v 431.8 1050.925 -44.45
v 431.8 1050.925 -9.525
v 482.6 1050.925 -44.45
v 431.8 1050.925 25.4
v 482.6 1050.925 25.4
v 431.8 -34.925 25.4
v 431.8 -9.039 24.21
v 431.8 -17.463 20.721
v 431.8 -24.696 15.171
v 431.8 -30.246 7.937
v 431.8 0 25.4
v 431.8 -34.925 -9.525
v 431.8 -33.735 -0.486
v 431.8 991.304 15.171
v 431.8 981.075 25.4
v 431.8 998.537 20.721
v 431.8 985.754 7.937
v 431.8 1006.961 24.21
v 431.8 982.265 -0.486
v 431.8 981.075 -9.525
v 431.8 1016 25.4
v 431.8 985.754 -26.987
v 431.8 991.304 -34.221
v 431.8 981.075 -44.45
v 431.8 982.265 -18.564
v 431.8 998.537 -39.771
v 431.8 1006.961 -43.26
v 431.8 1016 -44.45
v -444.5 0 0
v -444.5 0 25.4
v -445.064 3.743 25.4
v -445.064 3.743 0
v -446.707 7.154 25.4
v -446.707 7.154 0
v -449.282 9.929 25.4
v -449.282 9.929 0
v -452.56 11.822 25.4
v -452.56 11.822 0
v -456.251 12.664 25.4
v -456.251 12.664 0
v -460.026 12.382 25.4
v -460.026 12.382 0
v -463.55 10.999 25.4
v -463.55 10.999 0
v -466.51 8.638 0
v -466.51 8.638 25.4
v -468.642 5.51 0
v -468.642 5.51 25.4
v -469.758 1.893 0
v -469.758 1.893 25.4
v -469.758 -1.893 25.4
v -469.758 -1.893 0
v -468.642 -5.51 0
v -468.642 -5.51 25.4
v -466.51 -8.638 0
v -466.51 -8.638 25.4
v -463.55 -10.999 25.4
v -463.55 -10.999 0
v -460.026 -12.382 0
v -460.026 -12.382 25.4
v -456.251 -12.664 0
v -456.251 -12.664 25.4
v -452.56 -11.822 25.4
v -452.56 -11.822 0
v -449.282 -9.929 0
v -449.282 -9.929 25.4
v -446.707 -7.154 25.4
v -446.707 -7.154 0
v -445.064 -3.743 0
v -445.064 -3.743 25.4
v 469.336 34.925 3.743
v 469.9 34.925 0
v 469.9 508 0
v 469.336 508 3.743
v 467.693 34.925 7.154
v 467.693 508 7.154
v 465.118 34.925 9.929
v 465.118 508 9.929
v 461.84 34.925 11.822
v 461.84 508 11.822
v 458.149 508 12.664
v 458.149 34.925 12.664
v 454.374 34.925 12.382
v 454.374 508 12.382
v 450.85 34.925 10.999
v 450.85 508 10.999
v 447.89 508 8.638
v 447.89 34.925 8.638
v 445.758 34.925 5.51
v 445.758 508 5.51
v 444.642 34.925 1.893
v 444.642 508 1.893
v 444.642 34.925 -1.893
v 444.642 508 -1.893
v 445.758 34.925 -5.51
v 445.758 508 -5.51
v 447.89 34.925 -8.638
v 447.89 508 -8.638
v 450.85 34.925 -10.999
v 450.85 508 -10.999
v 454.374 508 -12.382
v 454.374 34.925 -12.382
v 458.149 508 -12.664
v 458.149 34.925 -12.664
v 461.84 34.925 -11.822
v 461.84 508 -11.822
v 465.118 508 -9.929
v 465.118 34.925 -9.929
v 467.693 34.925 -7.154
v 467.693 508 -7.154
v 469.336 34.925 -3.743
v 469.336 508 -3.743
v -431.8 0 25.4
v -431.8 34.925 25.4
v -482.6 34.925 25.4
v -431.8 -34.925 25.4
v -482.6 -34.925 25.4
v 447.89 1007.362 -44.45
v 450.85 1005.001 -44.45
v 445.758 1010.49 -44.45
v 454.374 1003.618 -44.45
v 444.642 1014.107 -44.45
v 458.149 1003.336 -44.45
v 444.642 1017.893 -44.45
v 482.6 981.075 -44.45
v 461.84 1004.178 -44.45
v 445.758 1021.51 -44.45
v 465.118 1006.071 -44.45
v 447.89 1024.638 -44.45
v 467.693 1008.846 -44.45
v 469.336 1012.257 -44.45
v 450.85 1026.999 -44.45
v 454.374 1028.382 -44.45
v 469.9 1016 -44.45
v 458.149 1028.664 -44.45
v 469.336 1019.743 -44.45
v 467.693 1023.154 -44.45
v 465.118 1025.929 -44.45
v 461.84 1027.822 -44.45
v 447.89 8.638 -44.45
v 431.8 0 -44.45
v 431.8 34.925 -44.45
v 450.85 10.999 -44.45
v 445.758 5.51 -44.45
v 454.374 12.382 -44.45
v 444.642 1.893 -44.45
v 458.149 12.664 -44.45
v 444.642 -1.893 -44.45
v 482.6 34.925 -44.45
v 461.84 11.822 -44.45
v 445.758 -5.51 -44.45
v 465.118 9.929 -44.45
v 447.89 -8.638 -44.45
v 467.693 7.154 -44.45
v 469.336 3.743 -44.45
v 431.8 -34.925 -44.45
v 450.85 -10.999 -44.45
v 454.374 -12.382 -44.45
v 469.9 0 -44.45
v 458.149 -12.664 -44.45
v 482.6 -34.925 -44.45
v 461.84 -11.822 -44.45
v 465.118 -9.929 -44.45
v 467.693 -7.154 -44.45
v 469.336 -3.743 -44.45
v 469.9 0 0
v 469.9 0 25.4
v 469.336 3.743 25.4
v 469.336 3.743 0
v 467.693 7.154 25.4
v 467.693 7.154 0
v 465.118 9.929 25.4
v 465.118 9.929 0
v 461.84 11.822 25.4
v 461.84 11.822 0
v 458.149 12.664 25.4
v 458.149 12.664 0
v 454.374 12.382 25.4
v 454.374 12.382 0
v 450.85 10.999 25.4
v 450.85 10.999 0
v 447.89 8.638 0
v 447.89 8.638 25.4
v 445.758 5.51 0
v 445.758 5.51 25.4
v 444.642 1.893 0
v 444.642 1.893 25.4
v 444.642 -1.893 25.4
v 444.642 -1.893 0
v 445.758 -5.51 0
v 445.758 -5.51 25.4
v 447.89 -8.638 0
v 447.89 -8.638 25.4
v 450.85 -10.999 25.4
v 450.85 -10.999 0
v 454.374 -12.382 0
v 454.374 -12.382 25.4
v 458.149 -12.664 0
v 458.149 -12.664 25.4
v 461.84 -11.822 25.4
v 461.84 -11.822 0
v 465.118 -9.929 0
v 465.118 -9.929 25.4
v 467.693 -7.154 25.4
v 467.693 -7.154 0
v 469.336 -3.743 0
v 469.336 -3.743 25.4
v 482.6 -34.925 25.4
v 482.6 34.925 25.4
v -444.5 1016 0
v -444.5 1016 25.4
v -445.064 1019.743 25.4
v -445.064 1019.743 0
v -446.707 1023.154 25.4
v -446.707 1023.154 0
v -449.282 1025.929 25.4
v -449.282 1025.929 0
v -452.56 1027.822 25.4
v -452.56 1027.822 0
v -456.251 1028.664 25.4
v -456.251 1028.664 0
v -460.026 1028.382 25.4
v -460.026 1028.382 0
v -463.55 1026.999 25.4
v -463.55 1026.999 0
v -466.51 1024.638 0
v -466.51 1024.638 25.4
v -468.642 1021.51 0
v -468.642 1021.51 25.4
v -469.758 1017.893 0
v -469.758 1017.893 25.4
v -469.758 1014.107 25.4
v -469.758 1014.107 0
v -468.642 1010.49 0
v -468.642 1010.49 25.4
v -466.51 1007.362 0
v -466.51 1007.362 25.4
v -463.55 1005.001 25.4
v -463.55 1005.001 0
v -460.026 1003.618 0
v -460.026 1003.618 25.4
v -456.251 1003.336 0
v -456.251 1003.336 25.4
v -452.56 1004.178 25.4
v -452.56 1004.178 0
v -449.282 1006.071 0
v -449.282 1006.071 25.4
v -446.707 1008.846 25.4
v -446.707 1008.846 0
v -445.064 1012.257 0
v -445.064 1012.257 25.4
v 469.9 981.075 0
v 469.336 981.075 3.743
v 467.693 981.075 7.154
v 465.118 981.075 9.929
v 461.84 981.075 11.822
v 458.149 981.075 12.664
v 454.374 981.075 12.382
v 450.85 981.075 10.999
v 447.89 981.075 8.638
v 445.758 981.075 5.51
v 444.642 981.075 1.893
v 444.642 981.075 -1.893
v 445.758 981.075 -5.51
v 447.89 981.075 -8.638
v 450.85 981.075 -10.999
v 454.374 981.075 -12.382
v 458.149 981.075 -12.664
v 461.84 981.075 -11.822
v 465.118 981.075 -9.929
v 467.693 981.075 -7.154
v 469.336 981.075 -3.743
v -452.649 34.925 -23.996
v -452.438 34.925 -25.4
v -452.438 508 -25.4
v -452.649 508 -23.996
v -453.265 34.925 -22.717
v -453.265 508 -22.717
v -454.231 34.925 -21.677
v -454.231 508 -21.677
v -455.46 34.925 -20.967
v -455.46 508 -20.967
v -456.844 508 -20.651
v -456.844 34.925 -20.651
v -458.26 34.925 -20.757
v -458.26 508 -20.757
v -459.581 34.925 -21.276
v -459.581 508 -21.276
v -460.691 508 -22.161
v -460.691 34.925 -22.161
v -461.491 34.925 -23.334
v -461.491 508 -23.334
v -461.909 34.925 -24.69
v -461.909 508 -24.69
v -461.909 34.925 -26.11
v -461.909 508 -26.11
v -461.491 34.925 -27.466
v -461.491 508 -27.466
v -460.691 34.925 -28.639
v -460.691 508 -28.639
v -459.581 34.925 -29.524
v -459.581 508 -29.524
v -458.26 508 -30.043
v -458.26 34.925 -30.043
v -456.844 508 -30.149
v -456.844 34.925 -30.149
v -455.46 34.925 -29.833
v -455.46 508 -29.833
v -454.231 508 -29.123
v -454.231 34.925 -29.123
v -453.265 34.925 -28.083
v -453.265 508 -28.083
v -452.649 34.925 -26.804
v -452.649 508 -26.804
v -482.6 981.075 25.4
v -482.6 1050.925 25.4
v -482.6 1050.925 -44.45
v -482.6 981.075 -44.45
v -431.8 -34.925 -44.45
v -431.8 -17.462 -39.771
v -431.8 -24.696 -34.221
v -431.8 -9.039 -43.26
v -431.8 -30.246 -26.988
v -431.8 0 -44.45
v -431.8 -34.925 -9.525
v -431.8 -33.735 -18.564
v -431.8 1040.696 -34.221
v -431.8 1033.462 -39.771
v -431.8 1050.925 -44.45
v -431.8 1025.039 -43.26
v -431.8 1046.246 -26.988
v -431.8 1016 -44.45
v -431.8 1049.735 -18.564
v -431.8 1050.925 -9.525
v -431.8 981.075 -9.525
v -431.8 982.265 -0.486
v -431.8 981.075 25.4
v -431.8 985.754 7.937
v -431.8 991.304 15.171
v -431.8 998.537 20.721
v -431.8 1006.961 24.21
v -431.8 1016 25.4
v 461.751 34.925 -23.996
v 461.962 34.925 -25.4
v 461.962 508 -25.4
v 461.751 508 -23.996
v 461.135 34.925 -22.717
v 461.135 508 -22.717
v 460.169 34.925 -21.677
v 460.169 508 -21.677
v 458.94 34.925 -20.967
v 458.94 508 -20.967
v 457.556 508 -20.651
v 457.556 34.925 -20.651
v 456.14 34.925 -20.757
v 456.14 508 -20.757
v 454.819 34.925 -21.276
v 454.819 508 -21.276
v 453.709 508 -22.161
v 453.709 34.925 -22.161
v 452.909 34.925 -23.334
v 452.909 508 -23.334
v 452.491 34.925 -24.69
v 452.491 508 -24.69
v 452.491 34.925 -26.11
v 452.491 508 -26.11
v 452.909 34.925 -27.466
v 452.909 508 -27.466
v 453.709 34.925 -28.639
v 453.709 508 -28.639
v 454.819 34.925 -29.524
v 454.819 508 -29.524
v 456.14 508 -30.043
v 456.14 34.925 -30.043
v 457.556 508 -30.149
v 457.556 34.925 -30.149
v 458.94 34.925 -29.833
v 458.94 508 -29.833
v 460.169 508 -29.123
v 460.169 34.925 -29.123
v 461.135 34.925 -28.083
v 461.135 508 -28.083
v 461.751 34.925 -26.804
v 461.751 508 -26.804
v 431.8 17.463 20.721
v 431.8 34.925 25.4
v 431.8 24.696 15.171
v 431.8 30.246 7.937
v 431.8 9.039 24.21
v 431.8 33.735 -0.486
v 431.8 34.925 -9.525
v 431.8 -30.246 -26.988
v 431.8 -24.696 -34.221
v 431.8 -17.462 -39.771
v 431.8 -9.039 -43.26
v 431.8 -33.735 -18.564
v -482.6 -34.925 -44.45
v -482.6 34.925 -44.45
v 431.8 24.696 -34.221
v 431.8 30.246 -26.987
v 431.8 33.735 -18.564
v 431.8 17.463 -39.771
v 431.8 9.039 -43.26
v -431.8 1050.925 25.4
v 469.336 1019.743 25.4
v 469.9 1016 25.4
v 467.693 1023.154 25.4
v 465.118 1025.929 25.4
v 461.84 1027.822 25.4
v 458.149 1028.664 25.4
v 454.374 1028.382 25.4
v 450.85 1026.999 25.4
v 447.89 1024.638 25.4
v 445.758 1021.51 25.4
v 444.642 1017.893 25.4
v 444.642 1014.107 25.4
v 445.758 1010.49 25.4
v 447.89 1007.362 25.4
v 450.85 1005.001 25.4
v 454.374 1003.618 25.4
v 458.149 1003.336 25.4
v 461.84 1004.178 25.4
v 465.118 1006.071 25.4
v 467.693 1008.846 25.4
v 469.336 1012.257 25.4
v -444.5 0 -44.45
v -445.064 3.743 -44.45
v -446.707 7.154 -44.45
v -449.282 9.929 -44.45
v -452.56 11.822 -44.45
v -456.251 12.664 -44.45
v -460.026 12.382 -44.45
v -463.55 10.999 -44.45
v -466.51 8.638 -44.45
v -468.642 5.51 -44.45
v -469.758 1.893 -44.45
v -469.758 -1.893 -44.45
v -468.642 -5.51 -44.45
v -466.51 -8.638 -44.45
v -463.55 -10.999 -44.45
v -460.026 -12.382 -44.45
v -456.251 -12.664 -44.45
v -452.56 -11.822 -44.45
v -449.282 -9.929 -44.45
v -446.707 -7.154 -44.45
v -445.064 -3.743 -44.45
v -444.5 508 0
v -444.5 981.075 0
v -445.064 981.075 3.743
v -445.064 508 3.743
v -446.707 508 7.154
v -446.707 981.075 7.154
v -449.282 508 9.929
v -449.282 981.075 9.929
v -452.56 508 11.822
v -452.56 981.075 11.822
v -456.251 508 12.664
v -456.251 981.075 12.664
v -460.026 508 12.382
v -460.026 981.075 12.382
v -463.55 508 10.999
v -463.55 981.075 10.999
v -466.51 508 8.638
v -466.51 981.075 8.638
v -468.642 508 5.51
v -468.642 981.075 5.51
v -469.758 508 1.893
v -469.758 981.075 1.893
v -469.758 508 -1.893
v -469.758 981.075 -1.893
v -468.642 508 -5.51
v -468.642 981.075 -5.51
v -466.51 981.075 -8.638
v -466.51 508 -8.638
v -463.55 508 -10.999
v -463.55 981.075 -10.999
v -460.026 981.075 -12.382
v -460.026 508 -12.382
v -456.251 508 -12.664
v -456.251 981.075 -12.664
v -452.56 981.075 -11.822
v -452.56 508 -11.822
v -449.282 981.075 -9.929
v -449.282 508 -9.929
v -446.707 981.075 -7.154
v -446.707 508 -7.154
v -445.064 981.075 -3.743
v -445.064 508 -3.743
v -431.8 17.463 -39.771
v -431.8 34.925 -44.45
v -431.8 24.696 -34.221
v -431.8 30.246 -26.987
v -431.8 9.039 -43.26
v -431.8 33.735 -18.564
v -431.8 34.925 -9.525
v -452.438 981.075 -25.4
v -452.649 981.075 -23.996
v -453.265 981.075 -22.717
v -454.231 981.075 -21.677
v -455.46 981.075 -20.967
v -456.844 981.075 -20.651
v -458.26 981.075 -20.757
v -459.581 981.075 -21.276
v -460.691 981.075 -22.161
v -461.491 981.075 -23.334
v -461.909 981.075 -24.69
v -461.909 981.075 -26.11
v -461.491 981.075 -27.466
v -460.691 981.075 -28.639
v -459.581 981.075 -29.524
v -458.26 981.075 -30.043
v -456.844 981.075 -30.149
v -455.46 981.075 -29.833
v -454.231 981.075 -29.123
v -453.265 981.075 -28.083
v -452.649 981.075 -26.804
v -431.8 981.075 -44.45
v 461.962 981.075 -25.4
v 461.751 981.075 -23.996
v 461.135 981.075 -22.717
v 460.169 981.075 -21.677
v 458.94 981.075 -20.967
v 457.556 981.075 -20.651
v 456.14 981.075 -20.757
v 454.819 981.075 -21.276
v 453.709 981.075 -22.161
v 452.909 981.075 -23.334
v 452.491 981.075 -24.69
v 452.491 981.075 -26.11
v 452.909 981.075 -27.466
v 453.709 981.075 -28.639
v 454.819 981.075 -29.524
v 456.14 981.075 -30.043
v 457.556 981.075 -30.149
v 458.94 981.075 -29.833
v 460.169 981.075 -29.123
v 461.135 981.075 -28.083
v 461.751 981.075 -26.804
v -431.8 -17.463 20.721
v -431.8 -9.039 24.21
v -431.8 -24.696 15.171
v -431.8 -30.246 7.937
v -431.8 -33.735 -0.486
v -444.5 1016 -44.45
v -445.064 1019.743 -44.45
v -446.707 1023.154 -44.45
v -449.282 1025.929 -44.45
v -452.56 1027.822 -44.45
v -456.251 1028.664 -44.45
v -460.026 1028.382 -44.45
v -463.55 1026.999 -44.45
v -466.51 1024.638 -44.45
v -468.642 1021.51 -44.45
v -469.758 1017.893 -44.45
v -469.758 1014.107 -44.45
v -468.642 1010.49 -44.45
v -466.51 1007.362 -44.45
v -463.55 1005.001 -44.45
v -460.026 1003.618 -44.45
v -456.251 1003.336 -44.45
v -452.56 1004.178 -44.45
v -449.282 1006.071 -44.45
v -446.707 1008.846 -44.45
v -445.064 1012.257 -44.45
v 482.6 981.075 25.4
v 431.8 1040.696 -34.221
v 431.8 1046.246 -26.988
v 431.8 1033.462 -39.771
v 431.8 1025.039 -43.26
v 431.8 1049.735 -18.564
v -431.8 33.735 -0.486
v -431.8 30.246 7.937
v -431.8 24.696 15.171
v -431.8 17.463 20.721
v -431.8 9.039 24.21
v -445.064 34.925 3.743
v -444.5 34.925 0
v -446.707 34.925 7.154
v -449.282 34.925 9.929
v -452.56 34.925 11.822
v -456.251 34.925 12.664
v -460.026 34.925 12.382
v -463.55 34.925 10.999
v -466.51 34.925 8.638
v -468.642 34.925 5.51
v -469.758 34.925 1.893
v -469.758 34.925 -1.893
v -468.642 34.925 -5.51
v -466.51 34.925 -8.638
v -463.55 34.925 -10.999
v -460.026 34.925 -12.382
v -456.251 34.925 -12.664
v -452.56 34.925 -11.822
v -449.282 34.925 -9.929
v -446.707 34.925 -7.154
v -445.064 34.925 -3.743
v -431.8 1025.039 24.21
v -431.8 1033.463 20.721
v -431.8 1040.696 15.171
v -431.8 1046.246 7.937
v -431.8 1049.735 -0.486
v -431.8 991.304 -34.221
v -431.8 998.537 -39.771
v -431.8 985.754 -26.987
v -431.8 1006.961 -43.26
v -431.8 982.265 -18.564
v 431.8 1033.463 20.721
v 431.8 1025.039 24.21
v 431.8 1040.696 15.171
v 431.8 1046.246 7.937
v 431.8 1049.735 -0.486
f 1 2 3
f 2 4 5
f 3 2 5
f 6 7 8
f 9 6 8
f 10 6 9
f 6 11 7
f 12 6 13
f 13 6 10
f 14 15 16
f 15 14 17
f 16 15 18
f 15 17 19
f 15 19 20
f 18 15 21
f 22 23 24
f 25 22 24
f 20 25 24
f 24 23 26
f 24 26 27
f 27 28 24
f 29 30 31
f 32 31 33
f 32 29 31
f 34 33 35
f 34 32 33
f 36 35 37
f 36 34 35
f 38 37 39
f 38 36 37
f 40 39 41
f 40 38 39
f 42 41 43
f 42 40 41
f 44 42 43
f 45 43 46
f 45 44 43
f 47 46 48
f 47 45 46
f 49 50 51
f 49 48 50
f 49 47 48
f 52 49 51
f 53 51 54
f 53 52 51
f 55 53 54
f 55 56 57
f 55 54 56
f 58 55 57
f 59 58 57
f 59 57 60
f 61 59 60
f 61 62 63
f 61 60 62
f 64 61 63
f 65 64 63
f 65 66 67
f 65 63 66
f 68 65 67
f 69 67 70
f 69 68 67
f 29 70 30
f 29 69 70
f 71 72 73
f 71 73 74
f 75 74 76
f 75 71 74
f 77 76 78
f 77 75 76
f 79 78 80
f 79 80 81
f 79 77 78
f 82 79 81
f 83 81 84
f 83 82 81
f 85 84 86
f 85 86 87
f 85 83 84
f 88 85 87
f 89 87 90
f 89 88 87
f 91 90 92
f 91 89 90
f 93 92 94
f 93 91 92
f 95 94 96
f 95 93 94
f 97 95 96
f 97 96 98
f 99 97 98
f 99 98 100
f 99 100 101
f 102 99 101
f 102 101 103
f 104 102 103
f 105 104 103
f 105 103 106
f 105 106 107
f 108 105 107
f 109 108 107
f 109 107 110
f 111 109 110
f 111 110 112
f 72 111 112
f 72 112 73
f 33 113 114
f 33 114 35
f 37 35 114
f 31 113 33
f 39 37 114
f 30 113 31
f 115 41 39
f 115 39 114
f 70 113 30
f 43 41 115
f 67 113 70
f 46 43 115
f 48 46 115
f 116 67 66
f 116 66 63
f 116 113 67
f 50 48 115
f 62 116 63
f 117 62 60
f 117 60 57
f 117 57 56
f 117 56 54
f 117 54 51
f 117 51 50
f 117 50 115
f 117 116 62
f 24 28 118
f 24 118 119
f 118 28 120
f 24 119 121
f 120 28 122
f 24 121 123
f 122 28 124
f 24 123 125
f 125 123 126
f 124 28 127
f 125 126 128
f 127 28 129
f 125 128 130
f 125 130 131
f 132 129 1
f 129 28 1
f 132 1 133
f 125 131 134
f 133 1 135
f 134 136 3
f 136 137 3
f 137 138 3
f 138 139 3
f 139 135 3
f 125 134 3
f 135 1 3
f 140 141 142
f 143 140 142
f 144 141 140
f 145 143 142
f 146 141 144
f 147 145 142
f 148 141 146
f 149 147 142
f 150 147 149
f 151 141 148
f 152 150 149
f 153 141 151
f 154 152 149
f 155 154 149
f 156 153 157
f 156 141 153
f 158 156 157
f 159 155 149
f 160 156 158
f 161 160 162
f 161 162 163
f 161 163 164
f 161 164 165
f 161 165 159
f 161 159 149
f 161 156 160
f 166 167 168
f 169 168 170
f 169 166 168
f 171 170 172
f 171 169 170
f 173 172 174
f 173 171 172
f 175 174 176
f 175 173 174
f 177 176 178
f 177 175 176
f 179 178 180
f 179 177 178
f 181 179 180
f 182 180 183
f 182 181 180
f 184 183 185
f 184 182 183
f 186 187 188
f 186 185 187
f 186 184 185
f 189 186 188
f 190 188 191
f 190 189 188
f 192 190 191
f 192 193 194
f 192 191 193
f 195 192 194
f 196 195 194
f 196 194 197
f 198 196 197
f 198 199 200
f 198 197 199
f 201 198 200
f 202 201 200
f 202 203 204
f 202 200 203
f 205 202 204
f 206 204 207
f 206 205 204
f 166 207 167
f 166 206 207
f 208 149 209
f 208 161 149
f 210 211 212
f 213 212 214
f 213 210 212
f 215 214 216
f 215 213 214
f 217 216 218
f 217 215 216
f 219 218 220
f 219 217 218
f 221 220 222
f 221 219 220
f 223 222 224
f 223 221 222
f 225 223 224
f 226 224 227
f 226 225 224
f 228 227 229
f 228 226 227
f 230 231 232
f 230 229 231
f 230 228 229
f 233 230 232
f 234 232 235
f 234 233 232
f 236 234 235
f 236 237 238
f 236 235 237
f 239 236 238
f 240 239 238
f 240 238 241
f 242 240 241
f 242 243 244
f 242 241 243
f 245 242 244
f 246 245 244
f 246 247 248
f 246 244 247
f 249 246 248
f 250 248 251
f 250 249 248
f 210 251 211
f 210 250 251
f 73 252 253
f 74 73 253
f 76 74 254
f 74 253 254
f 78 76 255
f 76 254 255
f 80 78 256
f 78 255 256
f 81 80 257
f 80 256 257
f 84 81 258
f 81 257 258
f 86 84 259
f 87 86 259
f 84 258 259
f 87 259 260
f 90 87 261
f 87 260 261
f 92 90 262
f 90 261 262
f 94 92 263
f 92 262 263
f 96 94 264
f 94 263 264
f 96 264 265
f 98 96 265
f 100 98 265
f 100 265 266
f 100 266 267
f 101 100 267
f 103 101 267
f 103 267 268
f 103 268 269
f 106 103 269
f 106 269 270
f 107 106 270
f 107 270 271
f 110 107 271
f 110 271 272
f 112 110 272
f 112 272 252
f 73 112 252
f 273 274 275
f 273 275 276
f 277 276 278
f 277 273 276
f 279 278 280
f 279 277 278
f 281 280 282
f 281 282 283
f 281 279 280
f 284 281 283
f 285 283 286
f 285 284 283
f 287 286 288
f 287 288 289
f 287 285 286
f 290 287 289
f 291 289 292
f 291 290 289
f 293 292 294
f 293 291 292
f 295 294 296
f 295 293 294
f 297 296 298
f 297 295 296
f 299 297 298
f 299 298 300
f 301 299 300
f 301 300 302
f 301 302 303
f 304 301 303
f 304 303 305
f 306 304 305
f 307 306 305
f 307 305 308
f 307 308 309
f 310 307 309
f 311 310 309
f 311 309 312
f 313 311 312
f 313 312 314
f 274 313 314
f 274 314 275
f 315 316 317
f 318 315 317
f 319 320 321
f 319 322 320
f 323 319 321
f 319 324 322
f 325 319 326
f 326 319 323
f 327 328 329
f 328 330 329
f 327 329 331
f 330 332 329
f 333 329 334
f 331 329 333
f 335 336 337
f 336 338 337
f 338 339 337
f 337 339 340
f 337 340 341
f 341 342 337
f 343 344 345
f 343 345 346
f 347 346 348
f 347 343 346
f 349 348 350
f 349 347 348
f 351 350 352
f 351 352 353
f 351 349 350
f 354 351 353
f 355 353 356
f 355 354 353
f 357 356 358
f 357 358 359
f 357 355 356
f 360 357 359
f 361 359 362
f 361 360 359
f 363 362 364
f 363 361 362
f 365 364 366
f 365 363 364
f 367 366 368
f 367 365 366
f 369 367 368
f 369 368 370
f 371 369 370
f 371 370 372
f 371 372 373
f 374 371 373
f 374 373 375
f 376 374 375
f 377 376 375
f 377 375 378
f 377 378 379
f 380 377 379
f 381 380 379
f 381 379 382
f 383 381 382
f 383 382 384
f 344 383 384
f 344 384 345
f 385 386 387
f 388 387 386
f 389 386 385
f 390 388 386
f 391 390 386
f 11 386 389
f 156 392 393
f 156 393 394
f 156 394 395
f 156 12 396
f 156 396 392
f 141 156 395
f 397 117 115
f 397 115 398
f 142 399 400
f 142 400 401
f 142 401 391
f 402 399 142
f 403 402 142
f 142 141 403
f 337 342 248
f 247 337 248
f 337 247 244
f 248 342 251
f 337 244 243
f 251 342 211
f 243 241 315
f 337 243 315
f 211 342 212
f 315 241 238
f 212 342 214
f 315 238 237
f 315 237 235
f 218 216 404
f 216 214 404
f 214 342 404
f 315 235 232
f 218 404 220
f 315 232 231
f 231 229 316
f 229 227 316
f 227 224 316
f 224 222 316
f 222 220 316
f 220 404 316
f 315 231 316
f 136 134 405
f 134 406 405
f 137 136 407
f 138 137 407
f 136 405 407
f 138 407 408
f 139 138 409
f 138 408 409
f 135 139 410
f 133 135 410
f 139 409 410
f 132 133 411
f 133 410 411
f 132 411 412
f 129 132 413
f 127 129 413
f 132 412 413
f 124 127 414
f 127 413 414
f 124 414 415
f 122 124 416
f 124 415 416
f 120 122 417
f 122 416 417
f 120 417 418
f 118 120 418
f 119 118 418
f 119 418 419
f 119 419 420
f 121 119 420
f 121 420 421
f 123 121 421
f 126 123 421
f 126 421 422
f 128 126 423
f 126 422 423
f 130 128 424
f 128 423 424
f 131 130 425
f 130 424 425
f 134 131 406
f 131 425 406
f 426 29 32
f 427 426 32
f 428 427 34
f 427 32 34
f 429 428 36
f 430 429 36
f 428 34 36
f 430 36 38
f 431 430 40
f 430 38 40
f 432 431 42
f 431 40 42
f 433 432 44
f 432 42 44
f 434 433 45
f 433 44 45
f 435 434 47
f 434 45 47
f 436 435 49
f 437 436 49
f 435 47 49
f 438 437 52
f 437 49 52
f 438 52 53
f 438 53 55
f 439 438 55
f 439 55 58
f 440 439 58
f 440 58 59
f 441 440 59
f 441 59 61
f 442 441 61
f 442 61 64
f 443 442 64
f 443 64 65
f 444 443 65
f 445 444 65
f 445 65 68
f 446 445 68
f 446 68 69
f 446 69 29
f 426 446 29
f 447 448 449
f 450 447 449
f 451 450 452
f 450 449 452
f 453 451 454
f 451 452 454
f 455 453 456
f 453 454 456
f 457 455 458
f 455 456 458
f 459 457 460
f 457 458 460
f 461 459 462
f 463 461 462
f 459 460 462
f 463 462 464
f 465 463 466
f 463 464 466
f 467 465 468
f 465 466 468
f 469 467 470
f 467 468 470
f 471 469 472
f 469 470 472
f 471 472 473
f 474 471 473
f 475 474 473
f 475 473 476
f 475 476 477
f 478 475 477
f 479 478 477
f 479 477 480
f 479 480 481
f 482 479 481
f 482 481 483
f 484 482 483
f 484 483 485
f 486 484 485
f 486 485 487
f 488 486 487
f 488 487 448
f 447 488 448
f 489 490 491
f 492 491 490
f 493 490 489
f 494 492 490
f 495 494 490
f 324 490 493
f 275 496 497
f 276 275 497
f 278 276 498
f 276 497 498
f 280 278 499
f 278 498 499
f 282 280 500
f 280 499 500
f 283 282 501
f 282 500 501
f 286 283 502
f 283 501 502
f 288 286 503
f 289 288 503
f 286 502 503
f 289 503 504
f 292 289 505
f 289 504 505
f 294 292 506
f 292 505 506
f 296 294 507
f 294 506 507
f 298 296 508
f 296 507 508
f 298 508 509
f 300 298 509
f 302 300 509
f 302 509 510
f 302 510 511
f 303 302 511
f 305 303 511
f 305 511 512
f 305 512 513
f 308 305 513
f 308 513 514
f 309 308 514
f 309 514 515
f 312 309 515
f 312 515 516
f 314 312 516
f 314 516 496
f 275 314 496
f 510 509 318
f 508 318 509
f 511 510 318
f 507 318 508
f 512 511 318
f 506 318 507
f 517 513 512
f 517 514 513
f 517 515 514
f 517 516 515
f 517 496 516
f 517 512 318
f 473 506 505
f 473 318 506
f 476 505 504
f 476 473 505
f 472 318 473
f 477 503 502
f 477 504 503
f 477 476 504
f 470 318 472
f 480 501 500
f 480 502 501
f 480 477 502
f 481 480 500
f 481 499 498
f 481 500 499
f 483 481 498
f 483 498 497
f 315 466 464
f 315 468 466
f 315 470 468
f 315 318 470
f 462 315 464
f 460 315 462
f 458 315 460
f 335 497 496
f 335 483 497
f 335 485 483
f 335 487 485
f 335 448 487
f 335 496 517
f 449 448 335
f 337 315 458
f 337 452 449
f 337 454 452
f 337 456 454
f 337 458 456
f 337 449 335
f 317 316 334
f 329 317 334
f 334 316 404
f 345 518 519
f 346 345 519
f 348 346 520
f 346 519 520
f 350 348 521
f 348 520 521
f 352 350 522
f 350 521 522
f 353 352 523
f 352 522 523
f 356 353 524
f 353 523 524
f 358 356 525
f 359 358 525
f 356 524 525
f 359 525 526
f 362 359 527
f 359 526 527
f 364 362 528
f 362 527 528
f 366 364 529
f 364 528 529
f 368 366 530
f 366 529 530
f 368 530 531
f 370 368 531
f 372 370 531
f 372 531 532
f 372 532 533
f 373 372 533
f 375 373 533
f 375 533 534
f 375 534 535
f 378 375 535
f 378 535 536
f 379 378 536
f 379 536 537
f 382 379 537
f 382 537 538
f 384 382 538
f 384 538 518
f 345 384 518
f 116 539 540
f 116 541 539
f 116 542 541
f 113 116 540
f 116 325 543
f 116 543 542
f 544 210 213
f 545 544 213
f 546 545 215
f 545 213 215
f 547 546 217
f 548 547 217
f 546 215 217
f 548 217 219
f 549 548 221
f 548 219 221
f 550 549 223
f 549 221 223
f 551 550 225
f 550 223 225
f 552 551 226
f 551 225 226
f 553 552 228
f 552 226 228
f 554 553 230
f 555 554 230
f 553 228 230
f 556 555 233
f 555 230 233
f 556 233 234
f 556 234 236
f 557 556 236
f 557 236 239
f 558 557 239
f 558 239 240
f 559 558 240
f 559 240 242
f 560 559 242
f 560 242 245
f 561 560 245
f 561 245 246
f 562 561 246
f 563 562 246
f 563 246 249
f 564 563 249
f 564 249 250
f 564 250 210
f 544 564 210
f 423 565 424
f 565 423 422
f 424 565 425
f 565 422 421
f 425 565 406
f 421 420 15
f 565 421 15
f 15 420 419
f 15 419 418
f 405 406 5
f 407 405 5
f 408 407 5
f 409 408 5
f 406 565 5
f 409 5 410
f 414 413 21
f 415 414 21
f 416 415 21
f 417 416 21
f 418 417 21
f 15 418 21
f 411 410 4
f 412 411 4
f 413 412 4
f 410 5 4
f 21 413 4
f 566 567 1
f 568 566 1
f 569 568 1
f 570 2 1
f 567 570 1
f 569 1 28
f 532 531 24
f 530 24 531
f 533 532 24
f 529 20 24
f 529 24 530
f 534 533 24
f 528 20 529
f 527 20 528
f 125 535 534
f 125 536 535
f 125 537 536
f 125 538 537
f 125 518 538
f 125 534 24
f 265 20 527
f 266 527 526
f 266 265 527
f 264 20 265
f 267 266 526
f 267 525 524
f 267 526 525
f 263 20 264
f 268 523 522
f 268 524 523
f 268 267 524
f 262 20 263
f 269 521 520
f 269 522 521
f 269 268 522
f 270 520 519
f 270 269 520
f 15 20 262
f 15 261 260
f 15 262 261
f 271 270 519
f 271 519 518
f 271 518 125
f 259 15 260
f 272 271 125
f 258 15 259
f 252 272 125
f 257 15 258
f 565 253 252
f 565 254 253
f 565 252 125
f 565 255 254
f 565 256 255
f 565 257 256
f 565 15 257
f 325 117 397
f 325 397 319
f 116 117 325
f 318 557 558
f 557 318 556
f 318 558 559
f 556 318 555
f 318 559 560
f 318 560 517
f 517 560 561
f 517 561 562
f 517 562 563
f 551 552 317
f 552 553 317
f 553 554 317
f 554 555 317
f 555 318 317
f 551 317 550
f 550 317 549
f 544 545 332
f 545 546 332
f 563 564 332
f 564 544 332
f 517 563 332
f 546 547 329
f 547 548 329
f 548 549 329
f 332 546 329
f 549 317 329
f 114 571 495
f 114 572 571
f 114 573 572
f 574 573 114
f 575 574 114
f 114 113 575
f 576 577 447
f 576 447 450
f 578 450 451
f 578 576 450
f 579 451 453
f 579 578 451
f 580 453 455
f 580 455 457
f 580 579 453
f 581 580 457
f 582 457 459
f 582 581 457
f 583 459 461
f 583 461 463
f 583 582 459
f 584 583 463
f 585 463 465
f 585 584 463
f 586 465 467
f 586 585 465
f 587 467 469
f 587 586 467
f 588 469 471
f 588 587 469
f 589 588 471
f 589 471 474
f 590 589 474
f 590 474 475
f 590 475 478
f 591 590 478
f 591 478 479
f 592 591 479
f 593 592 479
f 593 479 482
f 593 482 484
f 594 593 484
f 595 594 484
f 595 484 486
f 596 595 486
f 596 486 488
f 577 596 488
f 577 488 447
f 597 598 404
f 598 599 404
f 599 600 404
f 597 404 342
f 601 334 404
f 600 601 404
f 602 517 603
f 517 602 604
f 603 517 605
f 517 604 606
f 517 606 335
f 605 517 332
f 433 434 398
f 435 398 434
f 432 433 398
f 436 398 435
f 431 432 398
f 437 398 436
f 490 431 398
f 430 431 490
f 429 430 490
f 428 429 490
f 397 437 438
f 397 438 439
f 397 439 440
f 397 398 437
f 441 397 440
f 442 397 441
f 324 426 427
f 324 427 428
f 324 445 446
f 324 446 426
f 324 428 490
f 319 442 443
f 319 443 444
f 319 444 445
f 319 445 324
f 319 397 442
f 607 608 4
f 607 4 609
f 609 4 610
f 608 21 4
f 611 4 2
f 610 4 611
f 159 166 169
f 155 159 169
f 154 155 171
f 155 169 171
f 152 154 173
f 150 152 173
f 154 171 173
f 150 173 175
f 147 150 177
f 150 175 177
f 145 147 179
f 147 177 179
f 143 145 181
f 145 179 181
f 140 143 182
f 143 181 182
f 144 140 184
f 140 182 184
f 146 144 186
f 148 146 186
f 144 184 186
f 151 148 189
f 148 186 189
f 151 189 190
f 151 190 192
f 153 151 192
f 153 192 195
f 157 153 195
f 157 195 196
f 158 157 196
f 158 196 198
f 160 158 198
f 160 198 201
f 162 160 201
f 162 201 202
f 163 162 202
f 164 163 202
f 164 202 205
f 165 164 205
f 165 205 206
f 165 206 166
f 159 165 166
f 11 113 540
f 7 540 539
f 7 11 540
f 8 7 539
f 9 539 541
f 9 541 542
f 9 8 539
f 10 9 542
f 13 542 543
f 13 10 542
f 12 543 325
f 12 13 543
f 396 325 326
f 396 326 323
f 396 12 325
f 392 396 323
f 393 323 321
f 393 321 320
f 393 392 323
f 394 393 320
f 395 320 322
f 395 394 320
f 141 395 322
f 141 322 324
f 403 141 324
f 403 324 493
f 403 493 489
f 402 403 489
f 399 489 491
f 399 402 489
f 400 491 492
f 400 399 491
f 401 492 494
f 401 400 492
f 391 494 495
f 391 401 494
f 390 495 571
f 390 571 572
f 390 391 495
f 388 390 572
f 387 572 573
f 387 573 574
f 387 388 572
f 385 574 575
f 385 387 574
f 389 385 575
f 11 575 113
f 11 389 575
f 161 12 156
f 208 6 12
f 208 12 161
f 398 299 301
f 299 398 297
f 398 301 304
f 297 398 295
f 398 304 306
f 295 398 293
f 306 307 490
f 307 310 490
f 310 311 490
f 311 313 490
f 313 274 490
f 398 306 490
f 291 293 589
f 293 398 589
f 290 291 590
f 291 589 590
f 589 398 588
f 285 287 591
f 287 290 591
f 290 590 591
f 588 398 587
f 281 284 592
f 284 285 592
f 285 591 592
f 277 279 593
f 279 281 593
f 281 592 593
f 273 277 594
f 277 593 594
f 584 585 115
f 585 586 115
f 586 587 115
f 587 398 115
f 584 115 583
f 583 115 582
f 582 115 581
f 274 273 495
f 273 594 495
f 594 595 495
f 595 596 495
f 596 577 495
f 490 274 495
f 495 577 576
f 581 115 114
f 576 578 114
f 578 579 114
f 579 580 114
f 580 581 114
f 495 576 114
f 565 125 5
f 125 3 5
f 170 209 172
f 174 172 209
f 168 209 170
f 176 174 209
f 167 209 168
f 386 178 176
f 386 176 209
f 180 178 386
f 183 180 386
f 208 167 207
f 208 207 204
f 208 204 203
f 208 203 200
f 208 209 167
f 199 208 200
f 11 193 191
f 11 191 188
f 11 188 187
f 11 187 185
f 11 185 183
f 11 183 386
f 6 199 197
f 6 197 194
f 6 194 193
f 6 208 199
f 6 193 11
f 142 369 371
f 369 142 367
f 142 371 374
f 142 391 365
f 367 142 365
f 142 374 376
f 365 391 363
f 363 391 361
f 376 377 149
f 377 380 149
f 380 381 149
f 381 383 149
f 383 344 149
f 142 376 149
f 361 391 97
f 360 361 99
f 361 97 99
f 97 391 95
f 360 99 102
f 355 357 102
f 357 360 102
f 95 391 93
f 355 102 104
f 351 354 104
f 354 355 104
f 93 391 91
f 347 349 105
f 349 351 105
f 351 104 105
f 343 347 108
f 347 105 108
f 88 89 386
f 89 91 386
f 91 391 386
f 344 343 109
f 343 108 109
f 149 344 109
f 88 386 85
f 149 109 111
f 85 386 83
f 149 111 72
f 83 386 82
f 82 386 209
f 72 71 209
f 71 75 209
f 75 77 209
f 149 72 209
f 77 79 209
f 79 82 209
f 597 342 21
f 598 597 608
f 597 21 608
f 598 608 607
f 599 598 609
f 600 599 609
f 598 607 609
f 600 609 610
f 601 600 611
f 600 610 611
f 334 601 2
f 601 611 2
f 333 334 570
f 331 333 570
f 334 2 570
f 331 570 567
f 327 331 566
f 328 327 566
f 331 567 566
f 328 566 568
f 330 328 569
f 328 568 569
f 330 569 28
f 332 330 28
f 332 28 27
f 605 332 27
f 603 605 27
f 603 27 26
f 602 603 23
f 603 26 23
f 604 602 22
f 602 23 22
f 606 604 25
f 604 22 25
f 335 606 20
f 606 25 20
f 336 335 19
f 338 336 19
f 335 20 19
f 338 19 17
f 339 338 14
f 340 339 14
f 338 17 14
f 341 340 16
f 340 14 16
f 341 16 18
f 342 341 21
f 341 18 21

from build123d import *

# Parameters (mm, degrees)
F0_R     = 4.7625
F0_R_2   = 12.7
F1_DEPTH = 34.925
F0_W     = 863.6
F0_H     = 34.925
F3_DEPTH = 508
F6_R     = 12.7
F7_DEPTH = 63.5


with BuildPart() as f1:
    # F0 (on Front) → F1 (new body, symmetric)
    with BuildSketch(Plane.XZ):
        Polygon((482.6, 25.4), (431.8, 25.4), (431.8, -9.525), (431.8, -44.45), (482.6, -44.45), align=None)
        with Locations((457.2, -25.4)):
            Circle(F0_R, mode=Mode.SUBTRACT)
        with Locations((457.2, 0)):
            Circle(F0_R_2, mode=Mode.SUBTRACT)
        with Locations((457.2, 0)):
            Circle(F0_R_2)
        with Locations((457.2, -25.4)):
            Circle(F0_R)
    extrude(amount=F1_DEPTH, both=True)



with BuildPart() as f1b:
    # F0 (on Front) → F1, piece 2 (new body, symmetric)
    with BuildSketch(Plane.XZ):
        Polygon((-431.8, -9.525), (-431.8, 25.4), (-482.6, 25.4), (-482.6, -44.45), (-431.8, -44.45), align=None)
        with Locations((-457.2, -25.4)):
            Circle(F0_R, mode=Mode.SUBTRACT)
        with Locations((-457.2, 0)):
            Circle(F0_R_2, mode=Mode.SUBTRACT)
        with Locations((-457.2, 0)):
            Circle(F0_R_2)
        with Locations((-457.2, -25.4)):
            Circle(F0_R)
    extrude(amount=F1_DEPTH, both=True)


with BuildPart() as f1_1:
    add(f1.part)

    add(f1b.part)  # F2 merges F1b
    # F0 (on Front) → F2 (revolve)
    with BuildSketch(Plane.XZ):
        with Locations((0, 7.9375)):
            Rectangle(F0_W, F0_H)
    revolve(axis=Axis((0, 0, -9.525), (1, 0, 0)))

    # F0 (on Front) → F3 (join)
    with BuildSketch(Plane.XZ):
        with Locations((457.2, 0)):
            Circle(F0_R_2)
        with Locations((457.2, -25.4)):
            Circle(F0_R)
        with Locations((-457.2, 0)):
            Circle(F0_R_2)
        with Locations((-457.2, -25.4)):
            Circle(F0_R)
    extrude(amount=-F3_DEPTH)

    # F5: F1 across plane


with BuildPart() as f1_2:
    add(f1_1.part)
    add(f1_1.part.mirror(Plane.XZ.offset(-508)))

    # F6 (on Top) → F7 (cut, symmetric)
    with BuildSketch(Plane.XY):
        with Locations((-457.2, 0)):
            Circle(F6_R)
        with Locations((-457.2, 1016)):
            Circle(F6_R)
        with Locations((457.2, 0)):
            Circle(F6_R)
        with Locations((457.2, 1016)):
            Circle(F6_R)
    extrude(amount=F7_DEPTH, both=True, mode=Mode.SUBTRACT)


solid = f1_2.part
